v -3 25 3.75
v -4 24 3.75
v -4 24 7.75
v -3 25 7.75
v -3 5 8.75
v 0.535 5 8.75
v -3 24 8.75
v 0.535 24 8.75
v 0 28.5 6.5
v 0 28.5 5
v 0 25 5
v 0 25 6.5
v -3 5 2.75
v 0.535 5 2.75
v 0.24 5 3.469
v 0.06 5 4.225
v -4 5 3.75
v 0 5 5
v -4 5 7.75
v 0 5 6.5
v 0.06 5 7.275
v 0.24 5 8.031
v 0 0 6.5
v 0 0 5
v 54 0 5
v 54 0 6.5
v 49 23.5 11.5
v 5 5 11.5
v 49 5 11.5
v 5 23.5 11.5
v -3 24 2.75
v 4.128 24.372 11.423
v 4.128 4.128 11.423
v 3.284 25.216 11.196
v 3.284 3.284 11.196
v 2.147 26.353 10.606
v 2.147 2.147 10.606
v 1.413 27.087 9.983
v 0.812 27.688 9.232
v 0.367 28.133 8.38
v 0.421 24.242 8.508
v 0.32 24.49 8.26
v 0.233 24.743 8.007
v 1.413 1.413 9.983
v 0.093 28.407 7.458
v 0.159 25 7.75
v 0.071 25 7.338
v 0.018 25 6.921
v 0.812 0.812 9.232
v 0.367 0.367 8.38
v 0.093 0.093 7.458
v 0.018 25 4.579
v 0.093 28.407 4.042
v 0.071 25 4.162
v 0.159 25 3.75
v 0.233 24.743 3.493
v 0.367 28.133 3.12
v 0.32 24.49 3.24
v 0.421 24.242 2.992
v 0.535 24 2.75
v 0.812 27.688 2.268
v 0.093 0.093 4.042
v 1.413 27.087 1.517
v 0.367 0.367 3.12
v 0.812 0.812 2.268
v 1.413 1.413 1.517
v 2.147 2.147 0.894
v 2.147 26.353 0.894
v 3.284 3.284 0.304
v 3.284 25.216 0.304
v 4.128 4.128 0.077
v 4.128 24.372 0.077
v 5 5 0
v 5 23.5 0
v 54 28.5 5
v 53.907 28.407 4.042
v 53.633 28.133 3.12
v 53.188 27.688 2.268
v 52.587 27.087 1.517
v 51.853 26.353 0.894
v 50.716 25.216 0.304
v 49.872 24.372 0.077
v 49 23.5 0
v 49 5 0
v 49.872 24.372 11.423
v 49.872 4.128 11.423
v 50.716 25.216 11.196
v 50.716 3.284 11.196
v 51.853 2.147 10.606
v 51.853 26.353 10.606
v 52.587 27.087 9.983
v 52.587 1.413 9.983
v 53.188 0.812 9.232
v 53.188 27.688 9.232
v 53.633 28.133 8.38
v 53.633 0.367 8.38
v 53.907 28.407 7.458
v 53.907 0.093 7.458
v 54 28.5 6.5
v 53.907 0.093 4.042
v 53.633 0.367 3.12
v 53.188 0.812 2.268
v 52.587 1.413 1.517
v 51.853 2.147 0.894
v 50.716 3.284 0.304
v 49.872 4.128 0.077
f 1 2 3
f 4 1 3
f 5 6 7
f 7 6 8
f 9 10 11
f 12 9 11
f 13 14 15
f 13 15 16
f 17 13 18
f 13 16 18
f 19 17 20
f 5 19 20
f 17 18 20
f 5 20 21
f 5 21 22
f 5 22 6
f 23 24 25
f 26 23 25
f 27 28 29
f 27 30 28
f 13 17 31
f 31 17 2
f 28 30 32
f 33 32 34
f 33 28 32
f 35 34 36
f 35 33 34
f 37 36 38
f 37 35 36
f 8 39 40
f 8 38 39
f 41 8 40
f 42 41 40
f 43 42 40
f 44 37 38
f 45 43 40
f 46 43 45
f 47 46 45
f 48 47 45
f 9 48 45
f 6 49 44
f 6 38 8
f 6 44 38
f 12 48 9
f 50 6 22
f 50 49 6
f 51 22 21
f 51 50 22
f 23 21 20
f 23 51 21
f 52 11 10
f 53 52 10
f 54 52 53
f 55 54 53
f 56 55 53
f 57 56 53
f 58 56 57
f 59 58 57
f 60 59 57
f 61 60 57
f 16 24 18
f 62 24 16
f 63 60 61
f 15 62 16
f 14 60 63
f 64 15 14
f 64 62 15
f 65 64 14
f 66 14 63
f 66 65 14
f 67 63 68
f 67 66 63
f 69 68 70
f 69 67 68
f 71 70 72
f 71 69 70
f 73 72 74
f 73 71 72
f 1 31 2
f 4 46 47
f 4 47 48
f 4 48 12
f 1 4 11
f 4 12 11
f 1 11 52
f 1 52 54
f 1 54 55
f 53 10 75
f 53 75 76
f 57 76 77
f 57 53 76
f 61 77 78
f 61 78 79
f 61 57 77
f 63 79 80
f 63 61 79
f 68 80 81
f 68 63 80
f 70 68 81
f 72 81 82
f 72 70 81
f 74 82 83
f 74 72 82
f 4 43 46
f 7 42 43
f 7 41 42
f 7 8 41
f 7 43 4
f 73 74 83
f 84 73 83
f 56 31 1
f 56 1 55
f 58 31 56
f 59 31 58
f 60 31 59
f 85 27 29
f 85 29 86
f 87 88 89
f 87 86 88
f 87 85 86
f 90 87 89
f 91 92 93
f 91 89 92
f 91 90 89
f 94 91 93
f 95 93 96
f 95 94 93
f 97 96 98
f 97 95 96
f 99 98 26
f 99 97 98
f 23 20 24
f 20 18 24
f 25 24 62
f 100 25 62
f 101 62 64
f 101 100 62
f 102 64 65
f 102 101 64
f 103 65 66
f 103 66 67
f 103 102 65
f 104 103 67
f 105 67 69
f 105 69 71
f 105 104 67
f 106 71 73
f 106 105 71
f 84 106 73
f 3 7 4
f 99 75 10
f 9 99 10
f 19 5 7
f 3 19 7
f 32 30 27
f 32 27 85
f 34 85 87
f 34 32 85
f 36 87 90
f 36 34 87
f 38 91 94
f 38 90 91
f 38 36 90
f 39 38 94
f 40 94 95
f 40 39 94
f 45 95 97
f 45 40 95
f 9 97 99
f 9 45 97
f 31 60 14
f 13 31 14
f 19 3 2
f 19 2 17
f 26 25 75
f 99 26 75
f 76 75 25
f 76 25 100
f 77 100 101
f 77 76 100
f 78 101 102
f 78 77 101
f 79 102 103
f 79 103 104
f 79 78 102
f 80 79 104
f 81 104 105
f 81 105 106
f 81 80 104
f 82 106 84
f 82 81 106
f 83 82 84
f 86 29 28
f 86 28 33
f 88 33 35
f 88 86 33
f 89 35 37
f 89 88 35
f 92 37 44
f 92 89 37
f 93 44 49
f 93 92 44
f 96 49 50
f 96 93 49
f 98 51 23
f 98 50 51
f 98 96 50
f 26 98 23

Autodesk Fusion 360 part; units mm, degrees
sketch "Boceto1" plane through (0, 0, 0) normal (0, 0, 1) x (1, 0, 0)
  line L0 (0, 0) -> (54, 0)
  line L1 (54, 0) -> (54, 28.5)
  line L2 (54, 28.5) -> (0, 28.5)
  line L3 (0, 28.5) -> (0, 0)
  dimension "d1" = 54
  dimension "d2" = 28.5
extrude "Extruir1" add sketch "Boceto1" along normal blind 11.5
fillet "Empalme1" radius 5 2 faces at (18, 9.5, 11.5) (18, 9.5, 0)
sketch "Boceto2" plane through (0, 0, 0) normal (-1, 0, 0) x (0, -1, 0)
  line L0 (-28.5, 5) -> (0, 5)
  line L1 (0, 5) -> (0, 6.5)
  line L2 (0, 6.5) -> (-28.5, 6.5)
  line L3 (-28.5, 6.5) -> (-28.5, 5)
  line L4 (-25, 2.75) -> (-5, 2.75)
  line L5 (-5, 2.75) -> (-5, 8.75)
  line L6 (-5, 8.75) -> (-25, 8.75)
  line L7 (-25, 8.75) -> (-25, 2.75)
  dimension "d7" = 5
  dimension "d8" = 20
  dimension "d9" = 6
  dimension "d10" = 2.75
extrude "Extruir2" add sketch "Boceto2" along normal blind 4 and the other way blind 1 contours L0 L2 L5 L7 | L0 L4 L5 L7 | L2 L5 L6 L7
chamfer "Chaflán1" distance 1 angle 45 5 edges at (-1.7326, 25, 8.75) (-1.7326, 25, 2.75) (-4, 15, 8.75) (-4, 15, 2.75) (-4, 25, 5.75)
equation "d10 = ( ( 11.5 - 6 ) / 2 ) * 1 mm"
